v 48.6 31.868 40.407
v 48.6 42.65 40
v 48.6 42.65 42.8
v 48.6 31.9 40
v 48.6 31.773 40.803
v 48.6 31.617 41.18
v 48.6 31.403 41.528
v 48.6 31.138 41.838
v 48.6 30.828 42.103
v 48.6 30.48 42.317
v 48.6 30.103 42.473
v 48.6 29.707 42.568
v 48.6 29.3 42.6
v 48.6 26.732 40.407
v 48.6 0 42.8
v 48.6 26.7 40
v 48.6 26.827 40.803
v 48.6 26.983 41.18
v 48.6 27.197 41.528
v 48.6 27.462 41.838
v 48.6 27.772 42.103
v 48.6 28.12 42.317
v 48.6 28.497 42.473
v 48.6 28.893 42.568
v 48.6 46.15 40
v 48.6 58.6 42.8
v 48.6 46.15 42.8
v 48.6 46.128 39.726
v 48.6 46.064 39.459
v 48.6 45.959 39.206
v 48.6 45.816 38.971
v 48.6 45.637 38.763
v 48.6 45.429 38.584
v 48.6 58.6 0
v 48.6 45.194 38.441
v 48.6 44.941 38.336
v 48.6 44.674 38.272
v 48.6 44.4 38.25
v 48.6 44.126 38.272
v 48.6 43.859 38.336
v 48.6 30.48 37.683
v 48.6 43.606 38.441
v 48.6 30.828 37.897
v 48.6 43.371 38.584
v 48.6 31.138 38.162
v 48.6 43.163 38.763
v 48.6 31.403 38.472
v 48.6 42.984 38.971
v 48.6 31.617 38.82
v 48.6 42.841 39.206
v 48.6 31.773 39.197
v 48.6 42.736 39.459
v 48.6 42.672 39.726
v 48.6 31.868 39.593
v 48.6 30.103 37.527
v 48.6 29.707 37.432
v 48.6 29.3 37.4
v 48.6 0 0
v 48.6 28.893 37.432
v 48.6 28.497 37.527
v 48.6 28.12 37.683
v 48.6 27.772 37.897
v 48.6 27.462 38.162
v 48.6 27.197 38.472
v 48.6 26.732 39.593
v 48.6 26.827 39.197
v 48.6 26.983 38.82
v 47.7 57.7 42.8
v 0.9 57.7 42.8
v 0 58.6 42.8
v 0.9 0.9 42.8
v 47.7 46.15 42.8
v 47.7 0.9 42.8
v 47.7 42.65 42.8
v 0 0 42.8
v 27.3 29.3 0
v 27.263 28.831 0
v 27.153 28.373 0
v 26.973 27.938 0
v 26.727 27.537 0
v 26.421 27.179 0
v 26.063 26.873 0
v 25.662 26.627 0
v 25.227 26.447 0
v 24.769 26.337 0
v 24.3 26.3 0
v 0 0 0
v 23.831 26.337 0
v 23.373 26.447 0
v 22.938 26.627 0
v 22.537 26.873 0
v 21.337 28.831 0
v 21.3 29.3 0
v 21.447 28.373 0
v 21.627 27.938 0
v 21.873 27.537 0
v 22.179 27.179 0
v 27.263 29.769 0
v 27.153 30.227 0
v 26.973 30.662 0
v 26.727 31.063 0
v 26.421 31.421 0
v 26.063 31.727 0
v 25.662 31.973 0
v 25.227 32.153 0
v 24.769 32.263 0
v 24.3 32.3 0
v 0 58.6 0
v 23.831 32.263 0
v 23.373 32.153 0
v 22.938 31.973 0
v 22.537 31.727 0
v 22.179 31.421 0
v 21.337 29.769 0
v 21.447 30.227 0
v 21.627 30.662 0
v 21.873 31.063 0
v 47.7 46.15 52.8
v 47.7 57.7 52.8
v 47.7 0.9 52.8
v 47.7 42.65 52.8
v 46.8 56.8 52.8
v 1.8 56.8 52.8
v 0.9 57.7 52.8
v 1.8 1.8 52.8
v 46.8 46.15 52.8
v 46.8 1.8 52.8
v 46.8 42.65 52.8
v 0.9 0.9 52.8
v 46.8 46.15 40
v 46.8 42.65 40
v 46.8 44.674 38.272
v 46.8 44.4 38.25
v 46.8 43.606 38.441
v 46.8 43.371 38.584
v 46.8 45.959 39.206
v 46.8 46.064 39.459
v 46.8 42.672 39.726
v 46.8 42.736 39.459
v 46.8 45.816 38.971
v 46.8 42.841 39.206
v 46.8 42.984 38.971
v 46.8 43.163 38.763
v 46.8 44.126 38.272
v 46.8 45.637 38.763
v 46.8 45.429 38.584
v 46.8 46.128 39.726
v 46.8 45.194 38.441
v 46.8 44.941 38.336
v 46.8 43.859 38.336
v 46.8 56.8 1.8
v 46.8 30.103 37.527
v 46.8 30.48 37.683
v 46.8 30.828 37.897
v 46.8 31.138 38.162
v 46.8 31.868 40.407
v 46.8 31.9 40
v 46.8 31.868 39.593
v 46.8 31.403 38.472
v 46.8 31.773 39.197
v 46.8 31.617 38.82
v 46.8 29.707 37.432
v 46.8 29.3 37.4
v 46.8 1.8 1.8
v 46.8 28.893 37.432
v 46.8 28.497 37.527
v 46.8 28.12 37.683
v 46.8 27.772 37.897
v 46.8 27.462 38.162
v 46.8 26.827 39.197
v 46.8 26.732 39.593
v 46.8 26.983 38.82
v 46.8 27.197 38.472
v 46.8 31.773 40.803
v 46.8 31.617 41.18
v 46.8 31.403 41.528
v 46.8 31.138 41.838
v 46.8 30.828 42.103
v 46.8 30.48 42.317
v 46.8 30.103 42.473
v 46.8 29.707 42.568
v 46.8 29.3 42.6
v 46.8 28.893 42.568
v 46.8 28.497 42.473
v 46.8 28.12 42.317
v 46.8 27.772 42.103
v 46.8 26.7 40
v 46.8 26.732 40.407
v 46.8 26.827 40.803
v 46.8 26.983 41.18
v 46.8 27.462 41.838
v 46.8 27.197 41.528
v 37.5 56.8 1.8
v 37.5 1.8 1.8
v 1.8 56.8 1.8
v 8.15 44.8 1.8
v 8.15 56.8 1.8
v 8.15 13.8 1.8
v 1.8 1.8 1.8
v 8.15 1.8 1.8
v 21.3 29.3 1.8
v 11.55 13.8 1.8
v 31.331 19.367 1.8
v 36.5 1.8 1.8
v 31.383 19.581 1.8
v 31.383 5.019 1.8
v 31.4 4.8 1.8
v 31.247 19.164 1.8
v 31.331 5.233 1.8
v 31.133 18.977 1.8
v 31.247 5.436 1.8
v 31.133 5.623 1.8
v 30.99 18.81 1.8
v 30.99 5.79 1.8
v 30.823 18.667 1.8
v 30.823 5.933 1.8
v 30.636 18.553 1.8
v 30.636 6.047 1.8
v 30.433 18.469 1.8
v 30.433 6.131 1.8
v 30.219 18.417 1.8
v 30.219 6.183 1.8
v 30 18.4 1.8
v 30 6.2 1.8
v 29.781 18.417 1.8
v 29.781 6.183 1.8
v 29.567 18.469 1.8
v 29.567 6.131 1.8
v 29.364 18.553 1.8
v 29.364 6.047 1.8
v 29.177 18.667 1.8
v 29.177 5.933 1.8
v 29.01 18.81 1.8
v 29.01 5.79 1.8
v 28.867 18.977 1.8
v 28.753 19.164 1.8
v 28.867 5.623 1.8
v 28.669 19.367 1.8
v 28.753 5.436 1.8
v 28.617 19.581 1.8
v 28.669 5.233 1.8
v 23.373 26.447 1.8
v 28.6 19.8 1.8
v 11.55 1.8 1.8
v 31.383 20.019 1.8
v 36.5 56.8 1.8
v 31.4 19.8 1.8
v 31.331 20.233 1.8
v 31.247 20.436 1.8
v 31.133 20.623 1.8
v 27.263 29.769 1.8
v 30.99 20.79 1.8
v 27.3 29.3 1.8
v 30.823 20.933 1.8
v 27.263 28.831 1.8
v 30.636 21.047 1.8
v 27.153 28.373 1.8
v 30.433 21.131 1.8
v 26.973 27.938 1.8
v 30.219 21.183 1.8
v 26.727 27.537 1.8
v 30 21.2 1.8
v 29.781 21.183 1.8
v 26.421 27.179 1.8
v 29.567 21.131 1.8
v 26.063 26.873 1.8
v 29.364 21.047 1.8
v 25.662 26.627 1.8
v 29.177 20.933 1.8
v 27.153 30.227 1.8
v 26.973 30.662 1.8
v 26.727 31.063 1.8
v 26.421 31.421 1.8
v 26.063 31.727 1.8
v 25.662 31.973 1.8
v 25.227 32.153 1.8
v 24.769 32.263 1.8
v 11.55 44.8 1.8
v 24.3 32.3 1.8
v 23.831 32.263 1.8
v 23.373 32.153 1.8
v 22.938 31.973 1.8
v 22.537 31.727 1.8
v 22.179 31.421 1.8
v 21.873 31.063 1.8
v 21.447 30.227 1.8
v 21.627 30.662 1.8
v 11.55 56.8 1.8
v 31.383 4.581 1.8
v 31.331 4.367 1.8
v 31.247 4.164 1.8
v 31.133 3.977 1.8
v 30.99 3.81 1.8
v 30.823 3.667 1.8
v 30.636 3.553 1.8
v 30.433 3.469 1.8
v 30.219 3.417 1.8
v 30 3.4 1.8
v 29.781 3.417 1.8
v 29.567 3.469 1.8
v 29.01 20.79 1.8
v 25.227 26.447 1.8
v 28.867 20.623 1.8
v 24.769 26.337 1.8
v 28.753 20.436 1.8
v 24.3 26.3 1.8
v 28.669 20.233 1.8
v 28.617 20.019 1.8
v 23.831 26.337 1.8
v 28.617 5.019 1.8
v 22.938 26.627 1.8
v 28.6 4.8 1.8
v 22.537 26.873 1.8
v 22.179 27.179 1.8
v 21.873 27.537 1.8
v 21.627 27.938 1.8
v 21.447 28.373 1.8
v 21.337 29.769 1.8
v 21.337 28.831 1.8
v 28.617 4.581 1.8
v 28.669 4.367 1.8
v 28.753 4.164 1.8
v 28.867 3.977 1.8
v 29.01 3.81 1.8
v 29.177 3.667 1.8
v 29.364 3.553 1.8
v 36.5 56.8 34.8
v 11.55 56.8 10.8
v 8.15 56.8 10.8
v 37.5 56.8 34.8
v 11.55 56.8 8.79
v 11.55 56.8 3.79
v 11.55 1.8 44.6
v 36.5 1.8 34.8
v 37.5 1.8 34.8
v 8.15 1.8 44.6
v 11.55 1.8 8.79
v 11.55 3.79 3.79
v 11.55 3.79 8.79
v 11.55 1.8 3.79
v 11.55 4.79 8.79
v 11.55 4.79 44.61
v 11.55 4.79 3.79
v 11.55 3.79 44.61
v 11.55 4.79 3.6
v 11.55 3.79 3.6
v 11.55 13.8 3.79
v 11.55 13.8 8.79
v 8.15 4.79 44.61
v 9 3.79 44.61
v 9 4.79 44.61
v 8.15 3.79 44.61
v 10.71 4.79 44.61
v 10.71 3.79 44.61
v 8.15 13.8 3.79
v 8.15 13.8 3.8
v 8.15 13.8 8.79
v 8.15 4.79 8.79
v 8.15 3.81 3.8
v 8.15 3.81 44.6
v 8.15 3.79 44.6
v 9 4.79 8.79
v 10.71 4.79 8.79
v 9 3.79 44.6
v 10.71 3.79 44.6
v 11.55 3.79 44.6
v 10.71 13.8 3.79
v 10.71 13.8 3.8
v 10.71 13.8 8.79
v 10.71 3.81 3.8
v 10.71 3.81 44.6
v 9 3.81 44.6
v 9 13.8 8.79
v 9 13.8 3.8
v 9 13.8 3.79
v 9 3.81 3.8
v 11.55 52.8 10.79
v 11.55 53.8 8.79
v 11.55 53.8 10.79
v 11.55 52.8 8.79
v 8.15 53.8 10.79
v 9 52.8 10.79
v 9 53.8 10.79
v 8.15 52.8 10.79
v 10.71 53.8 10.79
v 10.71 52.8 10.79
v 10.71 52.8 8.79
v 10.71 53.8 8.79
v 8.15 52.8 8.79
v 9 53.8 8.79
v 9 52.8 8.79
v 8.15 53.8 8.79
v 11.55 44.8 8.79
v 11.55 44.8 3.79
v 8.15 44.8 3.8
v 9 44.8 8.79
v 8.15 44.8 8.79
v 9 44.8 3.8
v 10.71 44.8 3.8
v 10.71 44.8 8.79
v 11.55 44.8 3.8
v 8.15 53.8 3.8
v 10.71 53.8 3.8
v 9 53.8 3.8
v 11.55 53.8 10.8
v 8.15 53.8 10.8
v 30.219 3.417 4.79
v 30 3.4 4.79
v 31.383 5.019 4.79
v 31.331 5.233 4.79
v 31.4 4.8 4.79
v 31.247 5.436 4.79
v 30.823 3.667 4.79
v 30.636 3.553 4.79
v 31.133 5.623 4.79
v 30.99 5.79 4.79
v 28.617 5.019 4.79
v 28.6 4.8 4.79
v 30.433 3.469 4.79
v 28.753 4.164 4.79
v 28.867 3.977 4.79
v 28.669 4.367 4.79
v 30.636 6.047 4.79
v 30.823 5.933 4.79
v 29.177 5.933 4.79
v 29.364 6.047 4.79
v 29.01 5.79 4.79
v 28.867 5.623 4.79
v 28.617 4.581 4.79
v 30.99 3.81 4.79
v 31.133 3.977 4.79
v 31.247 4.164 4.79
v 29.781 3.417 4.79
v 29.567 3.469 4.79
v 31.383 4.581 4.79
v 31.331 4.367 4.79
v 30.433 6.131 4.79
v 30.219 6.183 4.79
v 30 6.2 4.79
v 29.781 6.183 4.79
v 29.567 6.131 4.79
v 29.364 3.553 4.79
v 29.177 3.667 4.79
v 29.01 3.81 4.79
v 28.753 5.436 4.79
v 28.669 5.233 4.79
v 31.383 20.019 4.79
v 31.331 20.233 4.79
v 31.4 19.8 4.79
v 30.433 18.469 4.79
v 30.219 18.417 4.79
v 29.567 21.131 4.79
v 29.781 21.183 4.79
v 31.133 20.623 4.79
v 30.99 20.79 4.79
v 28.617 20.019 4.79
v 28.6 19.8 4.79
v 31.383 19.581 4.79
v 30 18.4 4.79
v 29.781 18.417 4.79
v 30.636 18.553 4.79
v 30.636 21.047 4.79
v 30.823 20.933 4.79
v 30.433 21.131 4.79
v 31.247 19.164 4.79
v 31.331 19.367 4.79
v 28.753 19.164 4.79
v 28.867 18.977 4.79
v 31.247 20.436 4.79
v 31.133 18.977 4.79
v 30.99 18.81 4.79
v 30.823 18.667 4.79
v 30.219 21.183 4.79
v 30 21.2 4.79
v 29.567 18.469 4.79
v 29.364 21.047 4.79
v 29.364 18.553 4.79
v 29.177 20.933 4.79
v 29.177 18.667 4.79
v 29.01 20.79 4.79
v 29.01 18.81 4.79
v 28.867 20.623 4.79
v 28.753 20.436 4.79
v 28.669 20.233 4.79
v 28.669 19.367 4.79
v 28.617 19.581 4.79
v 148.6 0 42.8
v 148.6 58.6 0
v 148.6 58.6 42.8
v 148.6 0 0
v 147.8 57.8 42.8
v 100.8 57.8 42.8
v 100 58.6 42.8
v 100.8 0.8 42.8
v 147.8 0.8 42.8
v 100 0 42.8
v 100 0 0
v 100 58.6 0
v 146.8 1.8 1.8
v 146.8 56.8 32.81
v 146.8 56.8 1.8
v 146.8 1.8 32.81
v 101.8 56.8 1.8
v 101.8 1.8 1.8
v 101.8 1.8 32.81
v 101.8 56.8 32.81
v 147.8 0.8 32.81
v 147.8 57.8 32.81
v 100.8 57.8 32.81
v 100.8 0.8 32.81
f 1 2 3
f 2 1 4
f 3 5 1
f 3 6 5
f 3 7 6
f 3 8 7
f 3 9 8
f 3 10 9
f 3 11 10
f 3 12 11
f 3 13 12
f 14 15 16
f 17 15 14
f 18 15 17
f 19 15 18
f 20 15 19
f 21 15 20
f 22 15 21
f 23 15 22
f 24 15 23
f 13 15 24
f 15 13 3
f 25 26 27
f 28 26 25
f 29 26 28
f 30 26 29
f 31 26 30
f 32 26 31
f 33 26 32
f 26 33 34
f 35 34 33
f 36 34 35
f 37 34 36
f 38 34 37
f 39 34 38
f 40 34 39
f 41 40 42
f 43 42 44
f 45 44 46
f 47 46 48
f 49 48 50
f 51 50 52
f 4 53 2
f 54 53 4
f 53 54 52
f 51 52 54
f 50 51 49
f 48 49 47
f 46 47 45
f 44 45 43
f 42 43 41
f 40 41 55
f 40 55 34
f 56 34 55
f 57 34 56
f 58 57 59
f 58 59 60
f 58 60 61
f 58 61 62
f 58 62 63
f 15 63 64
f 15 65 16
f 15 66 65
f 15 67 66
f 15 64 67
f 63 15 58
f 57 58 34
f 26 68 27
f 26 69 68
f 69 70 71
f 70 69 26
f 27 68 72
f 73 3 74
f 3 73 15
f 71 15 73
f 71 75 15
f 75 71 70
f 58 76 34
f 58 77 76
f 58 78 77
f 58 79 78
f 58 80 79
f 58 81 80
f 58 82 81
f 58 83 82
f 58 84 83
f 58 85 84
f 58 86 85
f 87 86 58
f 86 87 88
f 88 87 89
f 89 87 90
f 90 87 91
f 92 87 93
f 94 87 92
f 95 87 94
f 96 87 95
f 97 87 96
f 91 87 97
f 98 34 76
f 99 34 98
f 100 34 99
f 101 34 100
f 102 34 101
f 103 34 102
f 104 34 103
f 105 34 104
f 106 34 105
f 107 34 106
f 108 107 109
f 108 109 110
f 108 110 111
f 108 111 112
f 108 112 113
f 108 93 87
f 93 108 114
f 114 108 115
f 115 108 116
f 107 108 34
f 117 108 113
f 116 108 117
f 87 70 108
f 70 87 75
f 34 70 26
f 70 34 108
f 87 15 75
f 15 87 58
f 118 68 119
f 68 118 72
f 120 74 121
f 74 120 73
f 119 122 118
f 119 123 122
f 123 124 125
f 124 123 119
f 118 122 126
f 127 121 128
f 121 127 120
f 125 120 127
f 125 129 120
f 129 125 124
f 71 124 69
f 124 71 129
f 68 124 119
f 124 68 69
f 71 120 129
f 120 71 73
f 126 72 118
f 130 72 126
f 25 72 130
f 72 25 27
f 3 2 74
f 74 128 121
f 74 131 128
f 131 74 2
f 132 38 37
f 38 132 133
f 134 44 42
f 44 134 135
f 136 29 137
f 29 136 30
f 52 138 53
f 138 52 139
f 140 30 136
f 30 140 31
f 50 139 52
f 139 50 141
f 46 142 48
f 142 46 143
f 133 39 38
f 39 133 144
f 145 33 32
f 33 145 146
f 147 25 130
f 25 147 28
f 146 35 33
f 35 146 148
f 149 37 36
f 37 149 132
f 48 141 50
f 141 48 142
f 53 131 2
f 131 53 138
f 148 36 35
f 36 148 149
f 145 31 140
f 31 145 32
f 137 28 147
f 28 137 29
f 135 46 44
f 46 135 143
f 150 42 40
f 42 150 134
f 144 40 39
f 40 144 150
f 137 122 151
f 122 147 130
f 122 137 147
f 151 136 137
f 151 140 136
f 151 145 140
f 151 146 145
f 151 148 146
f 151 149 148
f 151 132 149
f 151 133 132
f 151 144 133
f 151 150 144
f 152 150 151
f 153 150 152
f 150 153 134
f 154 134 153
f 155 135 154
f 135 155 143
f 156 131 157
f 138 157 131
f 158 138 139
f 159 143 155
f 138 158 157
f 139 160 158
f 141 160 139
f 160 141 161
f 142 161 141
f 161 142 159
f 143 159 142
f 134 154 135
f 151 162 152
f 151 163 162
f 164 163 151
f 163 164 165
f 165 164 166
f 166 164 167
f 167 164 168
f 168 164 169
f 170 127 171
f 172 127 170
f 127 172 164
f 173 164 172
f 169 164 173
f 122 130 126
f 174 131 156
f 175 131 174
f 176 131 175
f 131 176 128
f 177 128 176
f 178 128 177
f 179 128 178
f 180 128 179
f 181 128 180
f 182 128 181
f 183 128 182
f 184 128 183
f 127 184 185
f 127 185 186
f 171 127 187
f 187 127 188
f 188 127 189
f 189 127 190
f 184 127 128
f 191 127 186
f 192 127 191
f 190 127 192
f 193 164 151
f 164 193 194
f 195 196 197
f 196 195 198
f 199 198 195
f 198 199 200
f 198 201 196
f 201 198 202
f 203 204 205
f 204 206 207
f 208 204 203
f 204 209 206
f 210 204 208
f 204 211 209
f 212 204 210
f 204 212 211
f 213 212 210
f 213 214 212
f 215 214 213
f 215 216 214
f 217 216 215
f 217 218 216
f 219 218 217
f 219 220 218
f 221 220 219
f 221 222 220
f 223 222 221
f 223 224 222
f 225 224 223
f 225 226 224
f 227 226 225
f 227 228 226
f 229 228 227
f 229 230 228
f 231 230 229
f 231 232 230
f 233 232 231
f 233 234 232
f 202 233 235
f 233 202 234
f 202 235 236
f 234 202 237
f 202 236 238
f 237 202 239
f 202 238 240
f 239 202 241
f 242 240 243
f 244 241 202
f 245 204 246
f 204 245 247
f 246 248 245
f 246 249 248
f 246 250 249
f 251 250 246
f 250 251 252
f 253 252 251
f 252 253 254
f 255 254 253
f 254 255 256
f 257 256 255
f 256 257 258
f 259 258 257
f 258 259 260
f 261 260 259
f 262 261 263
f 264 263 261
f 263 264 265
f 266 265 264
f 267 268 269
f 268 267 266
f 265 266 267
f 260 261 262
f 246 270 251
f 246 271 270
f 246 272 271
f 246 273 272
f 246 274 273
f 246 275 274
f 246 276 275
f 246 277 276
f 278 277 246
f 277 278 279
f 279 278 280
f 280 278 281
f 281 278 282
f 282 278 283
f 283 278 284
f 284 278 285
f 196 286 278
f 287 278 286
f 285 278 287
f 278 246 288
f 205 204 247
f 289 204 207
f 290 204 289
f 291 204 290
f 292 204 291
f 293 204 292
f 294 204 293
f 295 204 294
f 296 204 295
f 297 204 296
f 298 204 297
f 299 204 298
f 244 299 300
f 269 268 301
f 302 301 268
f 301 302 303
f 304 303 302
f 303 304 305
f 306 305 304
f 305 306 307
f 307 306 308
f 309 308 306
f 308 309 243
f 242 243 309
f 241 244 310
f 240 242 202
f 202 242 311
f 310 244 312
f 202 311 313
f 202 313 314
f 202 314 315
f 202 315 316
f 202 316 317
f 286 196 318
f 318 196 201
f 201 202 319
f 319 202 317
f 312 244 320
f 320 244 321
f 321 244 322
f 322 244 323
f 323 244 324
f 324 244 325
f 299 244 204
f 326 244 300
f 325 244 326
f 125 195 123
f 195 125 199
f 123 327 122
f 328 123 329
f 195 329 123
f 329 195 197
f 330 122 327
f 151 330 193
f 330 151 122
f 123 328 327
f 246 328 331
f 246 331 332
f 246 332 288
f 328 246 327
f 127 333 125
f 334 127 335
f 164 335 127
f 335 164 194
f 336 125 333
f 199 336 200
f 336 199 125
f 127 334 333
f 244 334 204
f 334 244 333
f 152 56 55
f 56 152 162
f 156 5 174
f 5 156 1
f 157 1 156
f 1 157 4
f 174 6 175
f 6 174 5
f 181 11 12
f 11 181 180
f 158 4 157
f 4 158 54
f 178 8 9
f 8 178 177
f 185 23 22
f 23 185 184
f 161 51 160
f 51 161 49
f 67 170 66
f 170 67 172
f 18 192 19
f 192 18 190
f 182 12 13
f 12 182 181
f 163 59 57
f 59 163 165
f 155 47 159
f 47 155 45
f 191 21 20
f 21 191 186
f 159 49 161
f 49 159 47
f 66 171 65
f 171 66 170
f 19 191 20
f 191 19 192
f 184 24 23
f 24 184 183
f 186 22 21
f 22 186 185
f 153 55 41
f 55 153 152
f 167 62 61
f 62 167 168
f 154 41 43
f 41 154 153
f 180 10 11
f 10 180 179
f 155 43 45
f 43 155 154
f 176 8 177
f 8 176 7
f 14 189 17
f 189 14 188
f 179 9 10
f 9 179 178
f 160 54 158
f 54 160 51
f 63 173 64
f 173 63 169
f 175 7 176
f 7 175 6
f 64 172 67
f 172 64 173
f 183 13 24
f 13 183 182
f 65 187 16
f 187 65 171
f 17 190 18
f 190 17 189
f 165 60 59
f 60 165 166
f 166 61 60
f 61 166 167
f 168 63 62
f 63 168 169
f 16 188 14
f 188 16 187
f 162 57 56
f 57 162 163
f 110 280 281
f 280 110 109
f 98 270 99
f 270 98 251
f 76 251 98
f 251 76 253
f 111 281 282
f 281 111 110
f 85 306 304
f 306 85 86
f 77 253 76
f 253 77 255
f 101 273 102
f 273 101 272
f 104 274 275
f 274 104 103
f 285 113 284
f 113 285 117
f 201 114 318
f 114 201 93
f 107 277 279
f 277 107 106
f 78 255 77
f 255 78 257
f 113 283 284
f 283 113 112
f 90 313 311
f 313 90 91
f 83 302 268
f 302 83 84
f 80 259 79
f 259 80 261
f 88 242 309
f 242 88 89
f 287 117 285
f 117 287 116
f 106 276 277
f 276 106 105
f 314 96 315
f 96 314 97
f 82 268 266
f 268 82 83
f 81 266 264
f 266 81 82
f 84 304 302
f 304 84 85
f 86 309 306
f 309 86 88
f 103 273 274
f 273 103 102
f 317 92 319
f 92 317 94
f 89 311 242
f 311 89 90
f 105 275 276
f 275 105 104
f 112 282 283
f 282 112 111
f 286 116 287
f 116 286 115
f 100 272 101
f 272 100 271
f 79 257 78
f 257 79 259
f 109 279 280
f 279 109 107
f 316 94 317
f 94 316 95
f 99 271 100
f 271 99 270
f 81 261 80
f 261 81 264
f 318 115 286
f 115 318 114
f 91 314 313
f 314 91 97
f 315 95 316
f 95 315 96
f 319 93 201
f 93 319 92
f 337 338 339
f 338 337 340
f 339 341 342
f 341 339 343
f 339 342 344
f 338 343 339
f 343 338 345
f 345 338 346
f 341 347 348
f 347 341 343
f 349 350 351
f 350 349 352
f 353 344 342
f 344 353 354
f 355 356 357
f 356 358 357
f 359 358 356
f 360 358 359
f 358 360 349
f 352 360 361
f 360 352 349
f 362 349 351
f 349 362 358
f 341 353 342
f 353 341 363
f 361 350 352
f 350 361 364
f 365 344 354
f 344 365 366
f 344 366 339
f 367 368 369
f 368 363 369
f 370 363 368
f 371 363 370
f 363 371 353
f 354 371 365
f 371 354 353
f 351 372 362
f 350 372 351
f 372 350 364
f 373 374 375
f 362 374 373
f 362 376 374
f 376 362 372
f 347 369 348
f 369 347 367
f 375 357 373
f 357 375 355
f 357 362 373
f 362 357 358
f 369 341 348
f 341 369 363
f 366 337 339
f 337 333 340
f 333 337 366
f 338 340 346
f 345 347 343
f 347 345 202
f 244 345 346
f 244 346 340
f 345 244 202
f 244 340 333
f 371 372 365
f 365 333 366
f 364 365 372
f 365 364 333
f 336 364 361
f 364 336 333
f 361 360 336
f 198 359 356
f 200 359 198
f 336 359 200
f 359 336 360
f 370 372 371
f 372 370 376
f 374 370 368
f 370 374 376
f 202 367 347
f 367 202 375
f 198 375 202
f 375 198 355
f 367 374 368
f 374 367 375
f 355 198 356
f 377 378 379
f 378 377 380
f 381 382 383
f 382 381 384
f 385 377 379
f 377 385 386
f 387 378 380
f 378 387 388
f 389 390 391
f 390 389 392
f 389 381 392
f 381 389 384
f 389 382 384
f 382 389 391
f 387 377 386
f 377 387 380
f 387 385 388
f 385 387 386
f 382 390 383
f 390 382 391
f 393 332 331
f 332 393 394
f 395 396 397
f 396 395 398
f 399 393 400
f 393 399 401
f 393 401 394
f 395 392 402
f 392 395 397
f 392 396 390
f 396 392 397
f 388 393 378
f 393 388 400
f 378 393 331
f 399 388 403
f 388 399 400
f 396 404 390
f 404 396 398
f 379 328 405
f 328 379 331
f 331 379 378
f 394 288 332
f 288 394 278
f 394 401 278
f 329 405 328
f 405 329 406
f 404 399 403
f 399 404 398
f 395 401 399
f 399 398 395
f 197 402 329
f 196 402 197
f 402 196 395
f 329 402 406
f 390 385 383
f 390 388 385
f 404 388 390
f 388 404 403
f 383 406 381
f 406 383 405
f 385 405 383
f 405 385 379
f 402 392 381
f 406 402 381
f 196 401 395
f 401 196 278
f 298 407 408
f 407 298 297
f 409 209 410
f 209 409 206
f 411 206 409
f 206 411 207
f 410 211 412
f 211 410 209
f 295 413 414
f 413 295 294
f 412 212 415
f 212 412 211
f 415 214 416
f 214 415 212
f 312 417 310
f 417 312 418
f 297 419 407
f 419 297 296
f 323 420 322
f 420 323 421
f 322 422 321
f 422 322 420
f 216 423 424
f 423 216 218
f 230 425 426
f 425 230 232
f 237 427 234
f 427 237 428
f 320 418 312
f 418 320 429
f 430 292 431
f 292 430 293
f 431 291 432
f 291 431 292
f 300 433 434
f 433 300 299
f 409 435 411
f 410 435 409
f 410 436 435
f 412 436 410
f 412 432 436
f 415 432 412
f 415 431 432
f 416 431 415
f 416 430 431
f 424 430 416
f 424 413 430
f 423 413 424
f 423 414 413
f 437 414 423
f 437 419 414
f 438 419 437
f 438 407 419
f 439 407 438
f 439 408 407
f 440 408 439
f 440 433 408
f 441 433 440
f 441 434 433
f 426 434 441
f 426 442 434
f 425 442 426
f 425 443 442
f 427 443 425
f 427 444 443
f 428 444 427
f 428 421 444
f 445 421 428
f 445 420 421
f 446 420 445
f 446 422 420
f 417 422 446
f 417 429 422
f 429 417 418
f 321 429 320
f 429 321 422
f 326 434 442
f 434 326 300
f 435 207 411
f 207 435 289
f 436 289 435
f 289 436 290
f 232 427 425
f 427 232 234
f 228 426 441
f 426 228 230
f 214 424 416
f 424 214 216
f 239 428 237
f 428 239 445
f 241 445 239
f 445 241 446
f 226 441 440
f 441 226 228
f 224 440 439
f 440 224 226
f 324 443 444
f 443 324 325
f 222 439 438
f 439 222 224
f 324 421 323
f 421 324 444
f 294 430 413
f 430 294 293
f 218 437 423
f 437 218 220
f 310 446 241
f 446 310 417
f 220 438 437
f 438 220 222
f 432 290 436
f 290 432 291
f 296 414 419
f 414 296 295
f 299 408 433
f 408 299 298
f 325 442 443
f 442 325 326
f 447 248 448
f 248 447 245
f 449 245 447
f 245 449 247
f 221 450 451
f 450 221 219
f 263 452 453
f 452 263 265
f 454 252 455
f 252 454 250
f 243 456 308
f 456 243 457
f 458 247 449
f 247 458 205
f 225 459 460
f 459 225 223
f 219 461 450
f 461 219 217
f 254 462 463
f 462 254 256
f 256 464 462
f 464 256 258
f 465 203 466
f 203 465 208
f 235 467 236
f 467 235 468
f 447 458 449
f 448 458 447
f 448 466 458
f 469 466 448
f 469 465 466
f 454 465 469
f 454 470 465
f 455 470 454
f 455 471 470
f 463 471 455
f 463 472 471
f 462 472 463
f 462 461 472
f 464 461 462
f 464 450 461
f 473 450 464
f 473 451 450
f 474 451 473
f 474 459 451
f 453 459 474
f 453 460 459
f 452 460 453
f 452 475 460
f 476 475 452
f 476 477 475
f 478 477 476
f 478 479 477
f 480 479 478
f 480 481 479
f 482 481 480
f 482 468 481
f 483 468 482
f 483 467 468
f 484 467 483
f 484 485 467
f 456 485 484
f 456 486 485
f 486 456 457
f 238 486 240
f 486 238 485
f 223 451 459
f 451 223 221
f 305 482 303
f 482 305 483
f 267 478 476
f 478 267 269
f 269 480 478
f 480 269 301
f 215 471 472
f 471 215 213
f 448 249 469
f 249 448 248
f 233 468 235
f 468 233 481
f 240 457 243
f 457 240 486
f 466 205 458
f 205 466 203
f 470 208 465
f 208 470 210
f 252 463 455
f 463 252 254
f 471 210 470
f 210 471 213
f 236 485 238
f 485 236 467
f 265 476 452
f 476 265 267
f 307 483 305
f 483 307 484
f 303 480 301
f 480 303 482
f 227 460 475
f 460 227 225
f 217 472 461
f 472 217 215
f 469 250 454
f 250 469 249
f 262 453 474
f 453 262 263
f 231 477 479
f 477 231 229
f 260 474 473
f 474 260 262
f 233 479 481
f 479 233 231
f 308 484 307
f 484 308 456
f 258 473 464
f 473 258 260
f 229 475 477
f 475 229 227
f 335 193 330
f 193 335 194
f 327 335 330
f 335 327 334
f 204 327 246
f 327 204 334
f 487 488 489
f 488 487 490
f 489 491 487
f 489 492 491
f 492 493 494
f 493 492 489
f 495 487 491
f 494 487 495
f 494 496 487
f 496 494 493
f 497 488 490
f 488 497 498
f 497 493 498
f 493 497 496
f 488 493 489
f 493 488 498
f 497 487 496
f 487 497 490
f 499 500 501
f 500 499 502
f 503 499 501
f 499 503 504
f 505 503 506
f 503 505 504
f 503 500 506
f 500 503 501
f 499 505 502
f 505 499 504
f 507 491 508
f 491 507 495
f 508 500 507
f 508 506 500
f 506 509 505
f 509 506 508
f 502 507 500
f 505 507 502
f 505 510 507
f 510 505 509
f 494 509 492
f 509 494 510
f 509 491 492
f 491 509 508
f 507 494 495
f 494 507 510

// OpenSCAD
DEBUG = false;

board_size = [1.5, 50, 80];
esp_size = [5, 51.8, 28.5];
hole_dia = 2;
inner_box = [45, 55, 82];
fatness = 3.6;
cable_hole_radius = 3.5;
cover_overlay = 10;
bottom_size = inner_box.z / 2 ;
top_size = inner_box.z - bottom_size;
board_thickens = 1.5;
rail_size = board_thickens + 0.2;
rail_thicknes = 1;
round_prec = 40;
led_hole_radius = 5.2;
acc_hole = 2.8;
power_hole_radius = 6;

echo("Box side thicknes ", fatness / 2);

module Board(x, y, z) {
    translate([x, y, z]) union() {
        color("black") cube(board_size);
    }
}

module ESP(x, y, z) {
    translate([x, y, z]) union() {
        color("black") cube(esp_size);
    }
}

module SideRail(x, y, z, length) {
    color("blue") translate([x, y, z]) difference() {
        cube([(rail_size * 2), rail_thicknes, length]);
        translate([rail_size / 2, 0, 0]) {
            cube([rail_size + .01, rail_thicknes + 0.1, length + 0.1]);
        }
    }
}

module BottomRail(x, y, z, length) {
    color("red") translate([x, y, z]) difference() {
        cube([(rail_size * 2), 5, length]);
        translate([rail_size / 2, 0, 0]) {
            cube([rail_size + .01, 5 + 0.1, length + 0.1]);
        }
    }
}

module PowerHole(x, y, z) {
    color("blue") rotate([0, 0, 0]) translate([x, y, z]) {
        cylinder(h = fatness + .02, d = power_hole_radius, $fn = round_prec);
    }
}

module LedHole(x, y, z) {
    color("blue") rotate([90, 0, 90]) translate([y, z, x]) {
        cylinder(h = fatness + .02, d = led_hole_radius, $fn = round_prec);
    }
}


module CableHole(x, y, z) {
    color("blue") rotate([90, 0, 90]) translate([y - fatness, z, x]) {
        translate([- cable_hole_radius / 2, 0, 0]) cube([cable_hole_radius, 100, fatness + .02]);
        cylinder(h = fatness + .02, d = cable_hole_radius, $fn = round_prec);
    }
}

module Bottom(x, y, z) {
    translate([x, y, z]) {
        difference() {
            union() {
                size = [inner_box.x + fatness, inner_box.y + fatness, (bottom_size + (fatness / 2))];
                cube(size);
                echo("Bottom size ", size);
                echo("Bottom overlay thicknes", (fatness / 2) - (fatness / 4));
                color("purple") translate([fatness / 4, fatness / 4, bottom_size + (fatness / 2)]) {
                    size = [inner_box.x + 2 * (fatness / 4), inner_box.y + 2 * (fatness / 4), cover_overlay];
                    echo("Bottom overlay ", size);
                    echo("Top overlay thicknes ", (fatness / 2) - (fatness / 4));
                    cube(size);
                }
            }
            translate([fatness / 2, fatness / 2, fatness / 2]) {
                color("gray") cube([inner_box.x, inner_box.y, bottom_size + 100]);
            }
            CableHole(inner_box.x + fatness / 2 - .01, inner_box.y - 7, 40);
            LedHole(inner_box.x + fatness / 2 - .01, fatness / 2 + inner_box.y / 2, 40);
            PowerHole(fatness / 2 + inner_box.x / 2, fatness / 2 + inner_box.y / 2, 0 - .01);
        }

        color("green") union() {
            translate([((inner_box.x / 5) - rail_size / 2), fatness / 2, fatness]) cube([rail_size * 2, 2.01,
                bottom_size]);
            SideRail(((inner_box.x / 5) - rail_size / 2), ((fatness / 2) + 2) - .01, z + fatness, bottom_size +
                .01)
            ;
            translate([(inner_box.x / 5) - rail_size / 2, (fatness / 2), fatness / 2]) cube([rail_size * 2, 12, 2]);
            rotate([90, 0, 0]) BottomRail(x + (inner_box.x / 5) - rail_size / 2, fatness / 2 - .01 + 2, - (12 + fatness
                / 2)
            , 12);
        }

        color("green") union() {
            translate([((inner_box.x / 5) - rail_size / 2), ((fatness / 2) + inner_box.y) - 3, fatness / 2 + 2])
                cube([rail_size * 2, 3.01, 7]);
            SideRail(((inner_box.x / 5) - rail_size / 2), (fatness / 2 + inner_box.y) - rail_thicknes - 3, z +
                    fatness / 2 + 7 - .01, 2);
            translate([(inner_box.x / 5) - rail_size / 2, (inner_box.y + fatness / 2) - 12, fatness / 2]) cube([
                    rail_size * 2, 12, 2]);
            rotate([90, 0, 0]) BottomRail((inner_box.x / 5) - rail_size / 2, fatness / 2 - .01 + 2, - (inner_box.y +
                    fatness / 2), 12);
        }


        color("pink") translate([(inner_box.x / 10) + 32, .01, fatness / 2]) cube([1, inner_box.y + fatness - .02, 33]);
        translate([inner_box.x - 15, fatness / 2 + 3, fatness / 2 - .01]) {
            roof_len = 22;
            acc_space = (roof_len - 15) / 2;
            echo("Acc space ", acc_space)
            color("white") translate([0, 0, 0]) {
                union() {
                    cylinder(h = 3, d = acc_hole, $fn = round_prec);
                    translate([0, 15, 0]) cylinder(h = 3, d = acc_hole, $fn = round_prec);
                }
            };
        }
        if (DEBUG) Board((inner_box.x / 5), fatness / 2 + 2, fatness / 2);
    }
}

module Cover(x, y, z) {
    translate([x, y, z]) {
        union() {
            difference() {
                size = [inner_box.x + fatness, inner_box.y + fatness, (top_size + (fatness / 2))];
                echo("Top size ", size);
                cube(size);
                translate([fatness / 2, fatness / 2, fatness / 2]) {
                    color("gray") cube([inner_box.x, inner_box.y, top_size + 100]);
                }
                taper_start = top_size - cover_overlay + fatness / 2 + .01;
                echo("Lower edge of taper ", taper_start, " taper height ", top_size - taper_start);
                translate([fatness / 4 - .1, fatness / 4 - .1, taper_start]) {
                    size = [inner_box.x + 2 * (fatness / 4 + .1), inner_box.y + 2 * (fatness / 4 + .1), cover_overlay];
                    echo("Top overlay thicknes ", size);
                    echo("Top overlay thicknes ", (fatness / 2) - (fatness / 4 - .1));
                    color("purple") cube(size);
                }
            }
        }
    }
}


Bottom(0, 0, 0);
Cover(100, 0, 0);
if (DEBUG) ESP(fatness / 2 + 40, (inner_box.y - esp_size.y) / 2, fatness / 2);
